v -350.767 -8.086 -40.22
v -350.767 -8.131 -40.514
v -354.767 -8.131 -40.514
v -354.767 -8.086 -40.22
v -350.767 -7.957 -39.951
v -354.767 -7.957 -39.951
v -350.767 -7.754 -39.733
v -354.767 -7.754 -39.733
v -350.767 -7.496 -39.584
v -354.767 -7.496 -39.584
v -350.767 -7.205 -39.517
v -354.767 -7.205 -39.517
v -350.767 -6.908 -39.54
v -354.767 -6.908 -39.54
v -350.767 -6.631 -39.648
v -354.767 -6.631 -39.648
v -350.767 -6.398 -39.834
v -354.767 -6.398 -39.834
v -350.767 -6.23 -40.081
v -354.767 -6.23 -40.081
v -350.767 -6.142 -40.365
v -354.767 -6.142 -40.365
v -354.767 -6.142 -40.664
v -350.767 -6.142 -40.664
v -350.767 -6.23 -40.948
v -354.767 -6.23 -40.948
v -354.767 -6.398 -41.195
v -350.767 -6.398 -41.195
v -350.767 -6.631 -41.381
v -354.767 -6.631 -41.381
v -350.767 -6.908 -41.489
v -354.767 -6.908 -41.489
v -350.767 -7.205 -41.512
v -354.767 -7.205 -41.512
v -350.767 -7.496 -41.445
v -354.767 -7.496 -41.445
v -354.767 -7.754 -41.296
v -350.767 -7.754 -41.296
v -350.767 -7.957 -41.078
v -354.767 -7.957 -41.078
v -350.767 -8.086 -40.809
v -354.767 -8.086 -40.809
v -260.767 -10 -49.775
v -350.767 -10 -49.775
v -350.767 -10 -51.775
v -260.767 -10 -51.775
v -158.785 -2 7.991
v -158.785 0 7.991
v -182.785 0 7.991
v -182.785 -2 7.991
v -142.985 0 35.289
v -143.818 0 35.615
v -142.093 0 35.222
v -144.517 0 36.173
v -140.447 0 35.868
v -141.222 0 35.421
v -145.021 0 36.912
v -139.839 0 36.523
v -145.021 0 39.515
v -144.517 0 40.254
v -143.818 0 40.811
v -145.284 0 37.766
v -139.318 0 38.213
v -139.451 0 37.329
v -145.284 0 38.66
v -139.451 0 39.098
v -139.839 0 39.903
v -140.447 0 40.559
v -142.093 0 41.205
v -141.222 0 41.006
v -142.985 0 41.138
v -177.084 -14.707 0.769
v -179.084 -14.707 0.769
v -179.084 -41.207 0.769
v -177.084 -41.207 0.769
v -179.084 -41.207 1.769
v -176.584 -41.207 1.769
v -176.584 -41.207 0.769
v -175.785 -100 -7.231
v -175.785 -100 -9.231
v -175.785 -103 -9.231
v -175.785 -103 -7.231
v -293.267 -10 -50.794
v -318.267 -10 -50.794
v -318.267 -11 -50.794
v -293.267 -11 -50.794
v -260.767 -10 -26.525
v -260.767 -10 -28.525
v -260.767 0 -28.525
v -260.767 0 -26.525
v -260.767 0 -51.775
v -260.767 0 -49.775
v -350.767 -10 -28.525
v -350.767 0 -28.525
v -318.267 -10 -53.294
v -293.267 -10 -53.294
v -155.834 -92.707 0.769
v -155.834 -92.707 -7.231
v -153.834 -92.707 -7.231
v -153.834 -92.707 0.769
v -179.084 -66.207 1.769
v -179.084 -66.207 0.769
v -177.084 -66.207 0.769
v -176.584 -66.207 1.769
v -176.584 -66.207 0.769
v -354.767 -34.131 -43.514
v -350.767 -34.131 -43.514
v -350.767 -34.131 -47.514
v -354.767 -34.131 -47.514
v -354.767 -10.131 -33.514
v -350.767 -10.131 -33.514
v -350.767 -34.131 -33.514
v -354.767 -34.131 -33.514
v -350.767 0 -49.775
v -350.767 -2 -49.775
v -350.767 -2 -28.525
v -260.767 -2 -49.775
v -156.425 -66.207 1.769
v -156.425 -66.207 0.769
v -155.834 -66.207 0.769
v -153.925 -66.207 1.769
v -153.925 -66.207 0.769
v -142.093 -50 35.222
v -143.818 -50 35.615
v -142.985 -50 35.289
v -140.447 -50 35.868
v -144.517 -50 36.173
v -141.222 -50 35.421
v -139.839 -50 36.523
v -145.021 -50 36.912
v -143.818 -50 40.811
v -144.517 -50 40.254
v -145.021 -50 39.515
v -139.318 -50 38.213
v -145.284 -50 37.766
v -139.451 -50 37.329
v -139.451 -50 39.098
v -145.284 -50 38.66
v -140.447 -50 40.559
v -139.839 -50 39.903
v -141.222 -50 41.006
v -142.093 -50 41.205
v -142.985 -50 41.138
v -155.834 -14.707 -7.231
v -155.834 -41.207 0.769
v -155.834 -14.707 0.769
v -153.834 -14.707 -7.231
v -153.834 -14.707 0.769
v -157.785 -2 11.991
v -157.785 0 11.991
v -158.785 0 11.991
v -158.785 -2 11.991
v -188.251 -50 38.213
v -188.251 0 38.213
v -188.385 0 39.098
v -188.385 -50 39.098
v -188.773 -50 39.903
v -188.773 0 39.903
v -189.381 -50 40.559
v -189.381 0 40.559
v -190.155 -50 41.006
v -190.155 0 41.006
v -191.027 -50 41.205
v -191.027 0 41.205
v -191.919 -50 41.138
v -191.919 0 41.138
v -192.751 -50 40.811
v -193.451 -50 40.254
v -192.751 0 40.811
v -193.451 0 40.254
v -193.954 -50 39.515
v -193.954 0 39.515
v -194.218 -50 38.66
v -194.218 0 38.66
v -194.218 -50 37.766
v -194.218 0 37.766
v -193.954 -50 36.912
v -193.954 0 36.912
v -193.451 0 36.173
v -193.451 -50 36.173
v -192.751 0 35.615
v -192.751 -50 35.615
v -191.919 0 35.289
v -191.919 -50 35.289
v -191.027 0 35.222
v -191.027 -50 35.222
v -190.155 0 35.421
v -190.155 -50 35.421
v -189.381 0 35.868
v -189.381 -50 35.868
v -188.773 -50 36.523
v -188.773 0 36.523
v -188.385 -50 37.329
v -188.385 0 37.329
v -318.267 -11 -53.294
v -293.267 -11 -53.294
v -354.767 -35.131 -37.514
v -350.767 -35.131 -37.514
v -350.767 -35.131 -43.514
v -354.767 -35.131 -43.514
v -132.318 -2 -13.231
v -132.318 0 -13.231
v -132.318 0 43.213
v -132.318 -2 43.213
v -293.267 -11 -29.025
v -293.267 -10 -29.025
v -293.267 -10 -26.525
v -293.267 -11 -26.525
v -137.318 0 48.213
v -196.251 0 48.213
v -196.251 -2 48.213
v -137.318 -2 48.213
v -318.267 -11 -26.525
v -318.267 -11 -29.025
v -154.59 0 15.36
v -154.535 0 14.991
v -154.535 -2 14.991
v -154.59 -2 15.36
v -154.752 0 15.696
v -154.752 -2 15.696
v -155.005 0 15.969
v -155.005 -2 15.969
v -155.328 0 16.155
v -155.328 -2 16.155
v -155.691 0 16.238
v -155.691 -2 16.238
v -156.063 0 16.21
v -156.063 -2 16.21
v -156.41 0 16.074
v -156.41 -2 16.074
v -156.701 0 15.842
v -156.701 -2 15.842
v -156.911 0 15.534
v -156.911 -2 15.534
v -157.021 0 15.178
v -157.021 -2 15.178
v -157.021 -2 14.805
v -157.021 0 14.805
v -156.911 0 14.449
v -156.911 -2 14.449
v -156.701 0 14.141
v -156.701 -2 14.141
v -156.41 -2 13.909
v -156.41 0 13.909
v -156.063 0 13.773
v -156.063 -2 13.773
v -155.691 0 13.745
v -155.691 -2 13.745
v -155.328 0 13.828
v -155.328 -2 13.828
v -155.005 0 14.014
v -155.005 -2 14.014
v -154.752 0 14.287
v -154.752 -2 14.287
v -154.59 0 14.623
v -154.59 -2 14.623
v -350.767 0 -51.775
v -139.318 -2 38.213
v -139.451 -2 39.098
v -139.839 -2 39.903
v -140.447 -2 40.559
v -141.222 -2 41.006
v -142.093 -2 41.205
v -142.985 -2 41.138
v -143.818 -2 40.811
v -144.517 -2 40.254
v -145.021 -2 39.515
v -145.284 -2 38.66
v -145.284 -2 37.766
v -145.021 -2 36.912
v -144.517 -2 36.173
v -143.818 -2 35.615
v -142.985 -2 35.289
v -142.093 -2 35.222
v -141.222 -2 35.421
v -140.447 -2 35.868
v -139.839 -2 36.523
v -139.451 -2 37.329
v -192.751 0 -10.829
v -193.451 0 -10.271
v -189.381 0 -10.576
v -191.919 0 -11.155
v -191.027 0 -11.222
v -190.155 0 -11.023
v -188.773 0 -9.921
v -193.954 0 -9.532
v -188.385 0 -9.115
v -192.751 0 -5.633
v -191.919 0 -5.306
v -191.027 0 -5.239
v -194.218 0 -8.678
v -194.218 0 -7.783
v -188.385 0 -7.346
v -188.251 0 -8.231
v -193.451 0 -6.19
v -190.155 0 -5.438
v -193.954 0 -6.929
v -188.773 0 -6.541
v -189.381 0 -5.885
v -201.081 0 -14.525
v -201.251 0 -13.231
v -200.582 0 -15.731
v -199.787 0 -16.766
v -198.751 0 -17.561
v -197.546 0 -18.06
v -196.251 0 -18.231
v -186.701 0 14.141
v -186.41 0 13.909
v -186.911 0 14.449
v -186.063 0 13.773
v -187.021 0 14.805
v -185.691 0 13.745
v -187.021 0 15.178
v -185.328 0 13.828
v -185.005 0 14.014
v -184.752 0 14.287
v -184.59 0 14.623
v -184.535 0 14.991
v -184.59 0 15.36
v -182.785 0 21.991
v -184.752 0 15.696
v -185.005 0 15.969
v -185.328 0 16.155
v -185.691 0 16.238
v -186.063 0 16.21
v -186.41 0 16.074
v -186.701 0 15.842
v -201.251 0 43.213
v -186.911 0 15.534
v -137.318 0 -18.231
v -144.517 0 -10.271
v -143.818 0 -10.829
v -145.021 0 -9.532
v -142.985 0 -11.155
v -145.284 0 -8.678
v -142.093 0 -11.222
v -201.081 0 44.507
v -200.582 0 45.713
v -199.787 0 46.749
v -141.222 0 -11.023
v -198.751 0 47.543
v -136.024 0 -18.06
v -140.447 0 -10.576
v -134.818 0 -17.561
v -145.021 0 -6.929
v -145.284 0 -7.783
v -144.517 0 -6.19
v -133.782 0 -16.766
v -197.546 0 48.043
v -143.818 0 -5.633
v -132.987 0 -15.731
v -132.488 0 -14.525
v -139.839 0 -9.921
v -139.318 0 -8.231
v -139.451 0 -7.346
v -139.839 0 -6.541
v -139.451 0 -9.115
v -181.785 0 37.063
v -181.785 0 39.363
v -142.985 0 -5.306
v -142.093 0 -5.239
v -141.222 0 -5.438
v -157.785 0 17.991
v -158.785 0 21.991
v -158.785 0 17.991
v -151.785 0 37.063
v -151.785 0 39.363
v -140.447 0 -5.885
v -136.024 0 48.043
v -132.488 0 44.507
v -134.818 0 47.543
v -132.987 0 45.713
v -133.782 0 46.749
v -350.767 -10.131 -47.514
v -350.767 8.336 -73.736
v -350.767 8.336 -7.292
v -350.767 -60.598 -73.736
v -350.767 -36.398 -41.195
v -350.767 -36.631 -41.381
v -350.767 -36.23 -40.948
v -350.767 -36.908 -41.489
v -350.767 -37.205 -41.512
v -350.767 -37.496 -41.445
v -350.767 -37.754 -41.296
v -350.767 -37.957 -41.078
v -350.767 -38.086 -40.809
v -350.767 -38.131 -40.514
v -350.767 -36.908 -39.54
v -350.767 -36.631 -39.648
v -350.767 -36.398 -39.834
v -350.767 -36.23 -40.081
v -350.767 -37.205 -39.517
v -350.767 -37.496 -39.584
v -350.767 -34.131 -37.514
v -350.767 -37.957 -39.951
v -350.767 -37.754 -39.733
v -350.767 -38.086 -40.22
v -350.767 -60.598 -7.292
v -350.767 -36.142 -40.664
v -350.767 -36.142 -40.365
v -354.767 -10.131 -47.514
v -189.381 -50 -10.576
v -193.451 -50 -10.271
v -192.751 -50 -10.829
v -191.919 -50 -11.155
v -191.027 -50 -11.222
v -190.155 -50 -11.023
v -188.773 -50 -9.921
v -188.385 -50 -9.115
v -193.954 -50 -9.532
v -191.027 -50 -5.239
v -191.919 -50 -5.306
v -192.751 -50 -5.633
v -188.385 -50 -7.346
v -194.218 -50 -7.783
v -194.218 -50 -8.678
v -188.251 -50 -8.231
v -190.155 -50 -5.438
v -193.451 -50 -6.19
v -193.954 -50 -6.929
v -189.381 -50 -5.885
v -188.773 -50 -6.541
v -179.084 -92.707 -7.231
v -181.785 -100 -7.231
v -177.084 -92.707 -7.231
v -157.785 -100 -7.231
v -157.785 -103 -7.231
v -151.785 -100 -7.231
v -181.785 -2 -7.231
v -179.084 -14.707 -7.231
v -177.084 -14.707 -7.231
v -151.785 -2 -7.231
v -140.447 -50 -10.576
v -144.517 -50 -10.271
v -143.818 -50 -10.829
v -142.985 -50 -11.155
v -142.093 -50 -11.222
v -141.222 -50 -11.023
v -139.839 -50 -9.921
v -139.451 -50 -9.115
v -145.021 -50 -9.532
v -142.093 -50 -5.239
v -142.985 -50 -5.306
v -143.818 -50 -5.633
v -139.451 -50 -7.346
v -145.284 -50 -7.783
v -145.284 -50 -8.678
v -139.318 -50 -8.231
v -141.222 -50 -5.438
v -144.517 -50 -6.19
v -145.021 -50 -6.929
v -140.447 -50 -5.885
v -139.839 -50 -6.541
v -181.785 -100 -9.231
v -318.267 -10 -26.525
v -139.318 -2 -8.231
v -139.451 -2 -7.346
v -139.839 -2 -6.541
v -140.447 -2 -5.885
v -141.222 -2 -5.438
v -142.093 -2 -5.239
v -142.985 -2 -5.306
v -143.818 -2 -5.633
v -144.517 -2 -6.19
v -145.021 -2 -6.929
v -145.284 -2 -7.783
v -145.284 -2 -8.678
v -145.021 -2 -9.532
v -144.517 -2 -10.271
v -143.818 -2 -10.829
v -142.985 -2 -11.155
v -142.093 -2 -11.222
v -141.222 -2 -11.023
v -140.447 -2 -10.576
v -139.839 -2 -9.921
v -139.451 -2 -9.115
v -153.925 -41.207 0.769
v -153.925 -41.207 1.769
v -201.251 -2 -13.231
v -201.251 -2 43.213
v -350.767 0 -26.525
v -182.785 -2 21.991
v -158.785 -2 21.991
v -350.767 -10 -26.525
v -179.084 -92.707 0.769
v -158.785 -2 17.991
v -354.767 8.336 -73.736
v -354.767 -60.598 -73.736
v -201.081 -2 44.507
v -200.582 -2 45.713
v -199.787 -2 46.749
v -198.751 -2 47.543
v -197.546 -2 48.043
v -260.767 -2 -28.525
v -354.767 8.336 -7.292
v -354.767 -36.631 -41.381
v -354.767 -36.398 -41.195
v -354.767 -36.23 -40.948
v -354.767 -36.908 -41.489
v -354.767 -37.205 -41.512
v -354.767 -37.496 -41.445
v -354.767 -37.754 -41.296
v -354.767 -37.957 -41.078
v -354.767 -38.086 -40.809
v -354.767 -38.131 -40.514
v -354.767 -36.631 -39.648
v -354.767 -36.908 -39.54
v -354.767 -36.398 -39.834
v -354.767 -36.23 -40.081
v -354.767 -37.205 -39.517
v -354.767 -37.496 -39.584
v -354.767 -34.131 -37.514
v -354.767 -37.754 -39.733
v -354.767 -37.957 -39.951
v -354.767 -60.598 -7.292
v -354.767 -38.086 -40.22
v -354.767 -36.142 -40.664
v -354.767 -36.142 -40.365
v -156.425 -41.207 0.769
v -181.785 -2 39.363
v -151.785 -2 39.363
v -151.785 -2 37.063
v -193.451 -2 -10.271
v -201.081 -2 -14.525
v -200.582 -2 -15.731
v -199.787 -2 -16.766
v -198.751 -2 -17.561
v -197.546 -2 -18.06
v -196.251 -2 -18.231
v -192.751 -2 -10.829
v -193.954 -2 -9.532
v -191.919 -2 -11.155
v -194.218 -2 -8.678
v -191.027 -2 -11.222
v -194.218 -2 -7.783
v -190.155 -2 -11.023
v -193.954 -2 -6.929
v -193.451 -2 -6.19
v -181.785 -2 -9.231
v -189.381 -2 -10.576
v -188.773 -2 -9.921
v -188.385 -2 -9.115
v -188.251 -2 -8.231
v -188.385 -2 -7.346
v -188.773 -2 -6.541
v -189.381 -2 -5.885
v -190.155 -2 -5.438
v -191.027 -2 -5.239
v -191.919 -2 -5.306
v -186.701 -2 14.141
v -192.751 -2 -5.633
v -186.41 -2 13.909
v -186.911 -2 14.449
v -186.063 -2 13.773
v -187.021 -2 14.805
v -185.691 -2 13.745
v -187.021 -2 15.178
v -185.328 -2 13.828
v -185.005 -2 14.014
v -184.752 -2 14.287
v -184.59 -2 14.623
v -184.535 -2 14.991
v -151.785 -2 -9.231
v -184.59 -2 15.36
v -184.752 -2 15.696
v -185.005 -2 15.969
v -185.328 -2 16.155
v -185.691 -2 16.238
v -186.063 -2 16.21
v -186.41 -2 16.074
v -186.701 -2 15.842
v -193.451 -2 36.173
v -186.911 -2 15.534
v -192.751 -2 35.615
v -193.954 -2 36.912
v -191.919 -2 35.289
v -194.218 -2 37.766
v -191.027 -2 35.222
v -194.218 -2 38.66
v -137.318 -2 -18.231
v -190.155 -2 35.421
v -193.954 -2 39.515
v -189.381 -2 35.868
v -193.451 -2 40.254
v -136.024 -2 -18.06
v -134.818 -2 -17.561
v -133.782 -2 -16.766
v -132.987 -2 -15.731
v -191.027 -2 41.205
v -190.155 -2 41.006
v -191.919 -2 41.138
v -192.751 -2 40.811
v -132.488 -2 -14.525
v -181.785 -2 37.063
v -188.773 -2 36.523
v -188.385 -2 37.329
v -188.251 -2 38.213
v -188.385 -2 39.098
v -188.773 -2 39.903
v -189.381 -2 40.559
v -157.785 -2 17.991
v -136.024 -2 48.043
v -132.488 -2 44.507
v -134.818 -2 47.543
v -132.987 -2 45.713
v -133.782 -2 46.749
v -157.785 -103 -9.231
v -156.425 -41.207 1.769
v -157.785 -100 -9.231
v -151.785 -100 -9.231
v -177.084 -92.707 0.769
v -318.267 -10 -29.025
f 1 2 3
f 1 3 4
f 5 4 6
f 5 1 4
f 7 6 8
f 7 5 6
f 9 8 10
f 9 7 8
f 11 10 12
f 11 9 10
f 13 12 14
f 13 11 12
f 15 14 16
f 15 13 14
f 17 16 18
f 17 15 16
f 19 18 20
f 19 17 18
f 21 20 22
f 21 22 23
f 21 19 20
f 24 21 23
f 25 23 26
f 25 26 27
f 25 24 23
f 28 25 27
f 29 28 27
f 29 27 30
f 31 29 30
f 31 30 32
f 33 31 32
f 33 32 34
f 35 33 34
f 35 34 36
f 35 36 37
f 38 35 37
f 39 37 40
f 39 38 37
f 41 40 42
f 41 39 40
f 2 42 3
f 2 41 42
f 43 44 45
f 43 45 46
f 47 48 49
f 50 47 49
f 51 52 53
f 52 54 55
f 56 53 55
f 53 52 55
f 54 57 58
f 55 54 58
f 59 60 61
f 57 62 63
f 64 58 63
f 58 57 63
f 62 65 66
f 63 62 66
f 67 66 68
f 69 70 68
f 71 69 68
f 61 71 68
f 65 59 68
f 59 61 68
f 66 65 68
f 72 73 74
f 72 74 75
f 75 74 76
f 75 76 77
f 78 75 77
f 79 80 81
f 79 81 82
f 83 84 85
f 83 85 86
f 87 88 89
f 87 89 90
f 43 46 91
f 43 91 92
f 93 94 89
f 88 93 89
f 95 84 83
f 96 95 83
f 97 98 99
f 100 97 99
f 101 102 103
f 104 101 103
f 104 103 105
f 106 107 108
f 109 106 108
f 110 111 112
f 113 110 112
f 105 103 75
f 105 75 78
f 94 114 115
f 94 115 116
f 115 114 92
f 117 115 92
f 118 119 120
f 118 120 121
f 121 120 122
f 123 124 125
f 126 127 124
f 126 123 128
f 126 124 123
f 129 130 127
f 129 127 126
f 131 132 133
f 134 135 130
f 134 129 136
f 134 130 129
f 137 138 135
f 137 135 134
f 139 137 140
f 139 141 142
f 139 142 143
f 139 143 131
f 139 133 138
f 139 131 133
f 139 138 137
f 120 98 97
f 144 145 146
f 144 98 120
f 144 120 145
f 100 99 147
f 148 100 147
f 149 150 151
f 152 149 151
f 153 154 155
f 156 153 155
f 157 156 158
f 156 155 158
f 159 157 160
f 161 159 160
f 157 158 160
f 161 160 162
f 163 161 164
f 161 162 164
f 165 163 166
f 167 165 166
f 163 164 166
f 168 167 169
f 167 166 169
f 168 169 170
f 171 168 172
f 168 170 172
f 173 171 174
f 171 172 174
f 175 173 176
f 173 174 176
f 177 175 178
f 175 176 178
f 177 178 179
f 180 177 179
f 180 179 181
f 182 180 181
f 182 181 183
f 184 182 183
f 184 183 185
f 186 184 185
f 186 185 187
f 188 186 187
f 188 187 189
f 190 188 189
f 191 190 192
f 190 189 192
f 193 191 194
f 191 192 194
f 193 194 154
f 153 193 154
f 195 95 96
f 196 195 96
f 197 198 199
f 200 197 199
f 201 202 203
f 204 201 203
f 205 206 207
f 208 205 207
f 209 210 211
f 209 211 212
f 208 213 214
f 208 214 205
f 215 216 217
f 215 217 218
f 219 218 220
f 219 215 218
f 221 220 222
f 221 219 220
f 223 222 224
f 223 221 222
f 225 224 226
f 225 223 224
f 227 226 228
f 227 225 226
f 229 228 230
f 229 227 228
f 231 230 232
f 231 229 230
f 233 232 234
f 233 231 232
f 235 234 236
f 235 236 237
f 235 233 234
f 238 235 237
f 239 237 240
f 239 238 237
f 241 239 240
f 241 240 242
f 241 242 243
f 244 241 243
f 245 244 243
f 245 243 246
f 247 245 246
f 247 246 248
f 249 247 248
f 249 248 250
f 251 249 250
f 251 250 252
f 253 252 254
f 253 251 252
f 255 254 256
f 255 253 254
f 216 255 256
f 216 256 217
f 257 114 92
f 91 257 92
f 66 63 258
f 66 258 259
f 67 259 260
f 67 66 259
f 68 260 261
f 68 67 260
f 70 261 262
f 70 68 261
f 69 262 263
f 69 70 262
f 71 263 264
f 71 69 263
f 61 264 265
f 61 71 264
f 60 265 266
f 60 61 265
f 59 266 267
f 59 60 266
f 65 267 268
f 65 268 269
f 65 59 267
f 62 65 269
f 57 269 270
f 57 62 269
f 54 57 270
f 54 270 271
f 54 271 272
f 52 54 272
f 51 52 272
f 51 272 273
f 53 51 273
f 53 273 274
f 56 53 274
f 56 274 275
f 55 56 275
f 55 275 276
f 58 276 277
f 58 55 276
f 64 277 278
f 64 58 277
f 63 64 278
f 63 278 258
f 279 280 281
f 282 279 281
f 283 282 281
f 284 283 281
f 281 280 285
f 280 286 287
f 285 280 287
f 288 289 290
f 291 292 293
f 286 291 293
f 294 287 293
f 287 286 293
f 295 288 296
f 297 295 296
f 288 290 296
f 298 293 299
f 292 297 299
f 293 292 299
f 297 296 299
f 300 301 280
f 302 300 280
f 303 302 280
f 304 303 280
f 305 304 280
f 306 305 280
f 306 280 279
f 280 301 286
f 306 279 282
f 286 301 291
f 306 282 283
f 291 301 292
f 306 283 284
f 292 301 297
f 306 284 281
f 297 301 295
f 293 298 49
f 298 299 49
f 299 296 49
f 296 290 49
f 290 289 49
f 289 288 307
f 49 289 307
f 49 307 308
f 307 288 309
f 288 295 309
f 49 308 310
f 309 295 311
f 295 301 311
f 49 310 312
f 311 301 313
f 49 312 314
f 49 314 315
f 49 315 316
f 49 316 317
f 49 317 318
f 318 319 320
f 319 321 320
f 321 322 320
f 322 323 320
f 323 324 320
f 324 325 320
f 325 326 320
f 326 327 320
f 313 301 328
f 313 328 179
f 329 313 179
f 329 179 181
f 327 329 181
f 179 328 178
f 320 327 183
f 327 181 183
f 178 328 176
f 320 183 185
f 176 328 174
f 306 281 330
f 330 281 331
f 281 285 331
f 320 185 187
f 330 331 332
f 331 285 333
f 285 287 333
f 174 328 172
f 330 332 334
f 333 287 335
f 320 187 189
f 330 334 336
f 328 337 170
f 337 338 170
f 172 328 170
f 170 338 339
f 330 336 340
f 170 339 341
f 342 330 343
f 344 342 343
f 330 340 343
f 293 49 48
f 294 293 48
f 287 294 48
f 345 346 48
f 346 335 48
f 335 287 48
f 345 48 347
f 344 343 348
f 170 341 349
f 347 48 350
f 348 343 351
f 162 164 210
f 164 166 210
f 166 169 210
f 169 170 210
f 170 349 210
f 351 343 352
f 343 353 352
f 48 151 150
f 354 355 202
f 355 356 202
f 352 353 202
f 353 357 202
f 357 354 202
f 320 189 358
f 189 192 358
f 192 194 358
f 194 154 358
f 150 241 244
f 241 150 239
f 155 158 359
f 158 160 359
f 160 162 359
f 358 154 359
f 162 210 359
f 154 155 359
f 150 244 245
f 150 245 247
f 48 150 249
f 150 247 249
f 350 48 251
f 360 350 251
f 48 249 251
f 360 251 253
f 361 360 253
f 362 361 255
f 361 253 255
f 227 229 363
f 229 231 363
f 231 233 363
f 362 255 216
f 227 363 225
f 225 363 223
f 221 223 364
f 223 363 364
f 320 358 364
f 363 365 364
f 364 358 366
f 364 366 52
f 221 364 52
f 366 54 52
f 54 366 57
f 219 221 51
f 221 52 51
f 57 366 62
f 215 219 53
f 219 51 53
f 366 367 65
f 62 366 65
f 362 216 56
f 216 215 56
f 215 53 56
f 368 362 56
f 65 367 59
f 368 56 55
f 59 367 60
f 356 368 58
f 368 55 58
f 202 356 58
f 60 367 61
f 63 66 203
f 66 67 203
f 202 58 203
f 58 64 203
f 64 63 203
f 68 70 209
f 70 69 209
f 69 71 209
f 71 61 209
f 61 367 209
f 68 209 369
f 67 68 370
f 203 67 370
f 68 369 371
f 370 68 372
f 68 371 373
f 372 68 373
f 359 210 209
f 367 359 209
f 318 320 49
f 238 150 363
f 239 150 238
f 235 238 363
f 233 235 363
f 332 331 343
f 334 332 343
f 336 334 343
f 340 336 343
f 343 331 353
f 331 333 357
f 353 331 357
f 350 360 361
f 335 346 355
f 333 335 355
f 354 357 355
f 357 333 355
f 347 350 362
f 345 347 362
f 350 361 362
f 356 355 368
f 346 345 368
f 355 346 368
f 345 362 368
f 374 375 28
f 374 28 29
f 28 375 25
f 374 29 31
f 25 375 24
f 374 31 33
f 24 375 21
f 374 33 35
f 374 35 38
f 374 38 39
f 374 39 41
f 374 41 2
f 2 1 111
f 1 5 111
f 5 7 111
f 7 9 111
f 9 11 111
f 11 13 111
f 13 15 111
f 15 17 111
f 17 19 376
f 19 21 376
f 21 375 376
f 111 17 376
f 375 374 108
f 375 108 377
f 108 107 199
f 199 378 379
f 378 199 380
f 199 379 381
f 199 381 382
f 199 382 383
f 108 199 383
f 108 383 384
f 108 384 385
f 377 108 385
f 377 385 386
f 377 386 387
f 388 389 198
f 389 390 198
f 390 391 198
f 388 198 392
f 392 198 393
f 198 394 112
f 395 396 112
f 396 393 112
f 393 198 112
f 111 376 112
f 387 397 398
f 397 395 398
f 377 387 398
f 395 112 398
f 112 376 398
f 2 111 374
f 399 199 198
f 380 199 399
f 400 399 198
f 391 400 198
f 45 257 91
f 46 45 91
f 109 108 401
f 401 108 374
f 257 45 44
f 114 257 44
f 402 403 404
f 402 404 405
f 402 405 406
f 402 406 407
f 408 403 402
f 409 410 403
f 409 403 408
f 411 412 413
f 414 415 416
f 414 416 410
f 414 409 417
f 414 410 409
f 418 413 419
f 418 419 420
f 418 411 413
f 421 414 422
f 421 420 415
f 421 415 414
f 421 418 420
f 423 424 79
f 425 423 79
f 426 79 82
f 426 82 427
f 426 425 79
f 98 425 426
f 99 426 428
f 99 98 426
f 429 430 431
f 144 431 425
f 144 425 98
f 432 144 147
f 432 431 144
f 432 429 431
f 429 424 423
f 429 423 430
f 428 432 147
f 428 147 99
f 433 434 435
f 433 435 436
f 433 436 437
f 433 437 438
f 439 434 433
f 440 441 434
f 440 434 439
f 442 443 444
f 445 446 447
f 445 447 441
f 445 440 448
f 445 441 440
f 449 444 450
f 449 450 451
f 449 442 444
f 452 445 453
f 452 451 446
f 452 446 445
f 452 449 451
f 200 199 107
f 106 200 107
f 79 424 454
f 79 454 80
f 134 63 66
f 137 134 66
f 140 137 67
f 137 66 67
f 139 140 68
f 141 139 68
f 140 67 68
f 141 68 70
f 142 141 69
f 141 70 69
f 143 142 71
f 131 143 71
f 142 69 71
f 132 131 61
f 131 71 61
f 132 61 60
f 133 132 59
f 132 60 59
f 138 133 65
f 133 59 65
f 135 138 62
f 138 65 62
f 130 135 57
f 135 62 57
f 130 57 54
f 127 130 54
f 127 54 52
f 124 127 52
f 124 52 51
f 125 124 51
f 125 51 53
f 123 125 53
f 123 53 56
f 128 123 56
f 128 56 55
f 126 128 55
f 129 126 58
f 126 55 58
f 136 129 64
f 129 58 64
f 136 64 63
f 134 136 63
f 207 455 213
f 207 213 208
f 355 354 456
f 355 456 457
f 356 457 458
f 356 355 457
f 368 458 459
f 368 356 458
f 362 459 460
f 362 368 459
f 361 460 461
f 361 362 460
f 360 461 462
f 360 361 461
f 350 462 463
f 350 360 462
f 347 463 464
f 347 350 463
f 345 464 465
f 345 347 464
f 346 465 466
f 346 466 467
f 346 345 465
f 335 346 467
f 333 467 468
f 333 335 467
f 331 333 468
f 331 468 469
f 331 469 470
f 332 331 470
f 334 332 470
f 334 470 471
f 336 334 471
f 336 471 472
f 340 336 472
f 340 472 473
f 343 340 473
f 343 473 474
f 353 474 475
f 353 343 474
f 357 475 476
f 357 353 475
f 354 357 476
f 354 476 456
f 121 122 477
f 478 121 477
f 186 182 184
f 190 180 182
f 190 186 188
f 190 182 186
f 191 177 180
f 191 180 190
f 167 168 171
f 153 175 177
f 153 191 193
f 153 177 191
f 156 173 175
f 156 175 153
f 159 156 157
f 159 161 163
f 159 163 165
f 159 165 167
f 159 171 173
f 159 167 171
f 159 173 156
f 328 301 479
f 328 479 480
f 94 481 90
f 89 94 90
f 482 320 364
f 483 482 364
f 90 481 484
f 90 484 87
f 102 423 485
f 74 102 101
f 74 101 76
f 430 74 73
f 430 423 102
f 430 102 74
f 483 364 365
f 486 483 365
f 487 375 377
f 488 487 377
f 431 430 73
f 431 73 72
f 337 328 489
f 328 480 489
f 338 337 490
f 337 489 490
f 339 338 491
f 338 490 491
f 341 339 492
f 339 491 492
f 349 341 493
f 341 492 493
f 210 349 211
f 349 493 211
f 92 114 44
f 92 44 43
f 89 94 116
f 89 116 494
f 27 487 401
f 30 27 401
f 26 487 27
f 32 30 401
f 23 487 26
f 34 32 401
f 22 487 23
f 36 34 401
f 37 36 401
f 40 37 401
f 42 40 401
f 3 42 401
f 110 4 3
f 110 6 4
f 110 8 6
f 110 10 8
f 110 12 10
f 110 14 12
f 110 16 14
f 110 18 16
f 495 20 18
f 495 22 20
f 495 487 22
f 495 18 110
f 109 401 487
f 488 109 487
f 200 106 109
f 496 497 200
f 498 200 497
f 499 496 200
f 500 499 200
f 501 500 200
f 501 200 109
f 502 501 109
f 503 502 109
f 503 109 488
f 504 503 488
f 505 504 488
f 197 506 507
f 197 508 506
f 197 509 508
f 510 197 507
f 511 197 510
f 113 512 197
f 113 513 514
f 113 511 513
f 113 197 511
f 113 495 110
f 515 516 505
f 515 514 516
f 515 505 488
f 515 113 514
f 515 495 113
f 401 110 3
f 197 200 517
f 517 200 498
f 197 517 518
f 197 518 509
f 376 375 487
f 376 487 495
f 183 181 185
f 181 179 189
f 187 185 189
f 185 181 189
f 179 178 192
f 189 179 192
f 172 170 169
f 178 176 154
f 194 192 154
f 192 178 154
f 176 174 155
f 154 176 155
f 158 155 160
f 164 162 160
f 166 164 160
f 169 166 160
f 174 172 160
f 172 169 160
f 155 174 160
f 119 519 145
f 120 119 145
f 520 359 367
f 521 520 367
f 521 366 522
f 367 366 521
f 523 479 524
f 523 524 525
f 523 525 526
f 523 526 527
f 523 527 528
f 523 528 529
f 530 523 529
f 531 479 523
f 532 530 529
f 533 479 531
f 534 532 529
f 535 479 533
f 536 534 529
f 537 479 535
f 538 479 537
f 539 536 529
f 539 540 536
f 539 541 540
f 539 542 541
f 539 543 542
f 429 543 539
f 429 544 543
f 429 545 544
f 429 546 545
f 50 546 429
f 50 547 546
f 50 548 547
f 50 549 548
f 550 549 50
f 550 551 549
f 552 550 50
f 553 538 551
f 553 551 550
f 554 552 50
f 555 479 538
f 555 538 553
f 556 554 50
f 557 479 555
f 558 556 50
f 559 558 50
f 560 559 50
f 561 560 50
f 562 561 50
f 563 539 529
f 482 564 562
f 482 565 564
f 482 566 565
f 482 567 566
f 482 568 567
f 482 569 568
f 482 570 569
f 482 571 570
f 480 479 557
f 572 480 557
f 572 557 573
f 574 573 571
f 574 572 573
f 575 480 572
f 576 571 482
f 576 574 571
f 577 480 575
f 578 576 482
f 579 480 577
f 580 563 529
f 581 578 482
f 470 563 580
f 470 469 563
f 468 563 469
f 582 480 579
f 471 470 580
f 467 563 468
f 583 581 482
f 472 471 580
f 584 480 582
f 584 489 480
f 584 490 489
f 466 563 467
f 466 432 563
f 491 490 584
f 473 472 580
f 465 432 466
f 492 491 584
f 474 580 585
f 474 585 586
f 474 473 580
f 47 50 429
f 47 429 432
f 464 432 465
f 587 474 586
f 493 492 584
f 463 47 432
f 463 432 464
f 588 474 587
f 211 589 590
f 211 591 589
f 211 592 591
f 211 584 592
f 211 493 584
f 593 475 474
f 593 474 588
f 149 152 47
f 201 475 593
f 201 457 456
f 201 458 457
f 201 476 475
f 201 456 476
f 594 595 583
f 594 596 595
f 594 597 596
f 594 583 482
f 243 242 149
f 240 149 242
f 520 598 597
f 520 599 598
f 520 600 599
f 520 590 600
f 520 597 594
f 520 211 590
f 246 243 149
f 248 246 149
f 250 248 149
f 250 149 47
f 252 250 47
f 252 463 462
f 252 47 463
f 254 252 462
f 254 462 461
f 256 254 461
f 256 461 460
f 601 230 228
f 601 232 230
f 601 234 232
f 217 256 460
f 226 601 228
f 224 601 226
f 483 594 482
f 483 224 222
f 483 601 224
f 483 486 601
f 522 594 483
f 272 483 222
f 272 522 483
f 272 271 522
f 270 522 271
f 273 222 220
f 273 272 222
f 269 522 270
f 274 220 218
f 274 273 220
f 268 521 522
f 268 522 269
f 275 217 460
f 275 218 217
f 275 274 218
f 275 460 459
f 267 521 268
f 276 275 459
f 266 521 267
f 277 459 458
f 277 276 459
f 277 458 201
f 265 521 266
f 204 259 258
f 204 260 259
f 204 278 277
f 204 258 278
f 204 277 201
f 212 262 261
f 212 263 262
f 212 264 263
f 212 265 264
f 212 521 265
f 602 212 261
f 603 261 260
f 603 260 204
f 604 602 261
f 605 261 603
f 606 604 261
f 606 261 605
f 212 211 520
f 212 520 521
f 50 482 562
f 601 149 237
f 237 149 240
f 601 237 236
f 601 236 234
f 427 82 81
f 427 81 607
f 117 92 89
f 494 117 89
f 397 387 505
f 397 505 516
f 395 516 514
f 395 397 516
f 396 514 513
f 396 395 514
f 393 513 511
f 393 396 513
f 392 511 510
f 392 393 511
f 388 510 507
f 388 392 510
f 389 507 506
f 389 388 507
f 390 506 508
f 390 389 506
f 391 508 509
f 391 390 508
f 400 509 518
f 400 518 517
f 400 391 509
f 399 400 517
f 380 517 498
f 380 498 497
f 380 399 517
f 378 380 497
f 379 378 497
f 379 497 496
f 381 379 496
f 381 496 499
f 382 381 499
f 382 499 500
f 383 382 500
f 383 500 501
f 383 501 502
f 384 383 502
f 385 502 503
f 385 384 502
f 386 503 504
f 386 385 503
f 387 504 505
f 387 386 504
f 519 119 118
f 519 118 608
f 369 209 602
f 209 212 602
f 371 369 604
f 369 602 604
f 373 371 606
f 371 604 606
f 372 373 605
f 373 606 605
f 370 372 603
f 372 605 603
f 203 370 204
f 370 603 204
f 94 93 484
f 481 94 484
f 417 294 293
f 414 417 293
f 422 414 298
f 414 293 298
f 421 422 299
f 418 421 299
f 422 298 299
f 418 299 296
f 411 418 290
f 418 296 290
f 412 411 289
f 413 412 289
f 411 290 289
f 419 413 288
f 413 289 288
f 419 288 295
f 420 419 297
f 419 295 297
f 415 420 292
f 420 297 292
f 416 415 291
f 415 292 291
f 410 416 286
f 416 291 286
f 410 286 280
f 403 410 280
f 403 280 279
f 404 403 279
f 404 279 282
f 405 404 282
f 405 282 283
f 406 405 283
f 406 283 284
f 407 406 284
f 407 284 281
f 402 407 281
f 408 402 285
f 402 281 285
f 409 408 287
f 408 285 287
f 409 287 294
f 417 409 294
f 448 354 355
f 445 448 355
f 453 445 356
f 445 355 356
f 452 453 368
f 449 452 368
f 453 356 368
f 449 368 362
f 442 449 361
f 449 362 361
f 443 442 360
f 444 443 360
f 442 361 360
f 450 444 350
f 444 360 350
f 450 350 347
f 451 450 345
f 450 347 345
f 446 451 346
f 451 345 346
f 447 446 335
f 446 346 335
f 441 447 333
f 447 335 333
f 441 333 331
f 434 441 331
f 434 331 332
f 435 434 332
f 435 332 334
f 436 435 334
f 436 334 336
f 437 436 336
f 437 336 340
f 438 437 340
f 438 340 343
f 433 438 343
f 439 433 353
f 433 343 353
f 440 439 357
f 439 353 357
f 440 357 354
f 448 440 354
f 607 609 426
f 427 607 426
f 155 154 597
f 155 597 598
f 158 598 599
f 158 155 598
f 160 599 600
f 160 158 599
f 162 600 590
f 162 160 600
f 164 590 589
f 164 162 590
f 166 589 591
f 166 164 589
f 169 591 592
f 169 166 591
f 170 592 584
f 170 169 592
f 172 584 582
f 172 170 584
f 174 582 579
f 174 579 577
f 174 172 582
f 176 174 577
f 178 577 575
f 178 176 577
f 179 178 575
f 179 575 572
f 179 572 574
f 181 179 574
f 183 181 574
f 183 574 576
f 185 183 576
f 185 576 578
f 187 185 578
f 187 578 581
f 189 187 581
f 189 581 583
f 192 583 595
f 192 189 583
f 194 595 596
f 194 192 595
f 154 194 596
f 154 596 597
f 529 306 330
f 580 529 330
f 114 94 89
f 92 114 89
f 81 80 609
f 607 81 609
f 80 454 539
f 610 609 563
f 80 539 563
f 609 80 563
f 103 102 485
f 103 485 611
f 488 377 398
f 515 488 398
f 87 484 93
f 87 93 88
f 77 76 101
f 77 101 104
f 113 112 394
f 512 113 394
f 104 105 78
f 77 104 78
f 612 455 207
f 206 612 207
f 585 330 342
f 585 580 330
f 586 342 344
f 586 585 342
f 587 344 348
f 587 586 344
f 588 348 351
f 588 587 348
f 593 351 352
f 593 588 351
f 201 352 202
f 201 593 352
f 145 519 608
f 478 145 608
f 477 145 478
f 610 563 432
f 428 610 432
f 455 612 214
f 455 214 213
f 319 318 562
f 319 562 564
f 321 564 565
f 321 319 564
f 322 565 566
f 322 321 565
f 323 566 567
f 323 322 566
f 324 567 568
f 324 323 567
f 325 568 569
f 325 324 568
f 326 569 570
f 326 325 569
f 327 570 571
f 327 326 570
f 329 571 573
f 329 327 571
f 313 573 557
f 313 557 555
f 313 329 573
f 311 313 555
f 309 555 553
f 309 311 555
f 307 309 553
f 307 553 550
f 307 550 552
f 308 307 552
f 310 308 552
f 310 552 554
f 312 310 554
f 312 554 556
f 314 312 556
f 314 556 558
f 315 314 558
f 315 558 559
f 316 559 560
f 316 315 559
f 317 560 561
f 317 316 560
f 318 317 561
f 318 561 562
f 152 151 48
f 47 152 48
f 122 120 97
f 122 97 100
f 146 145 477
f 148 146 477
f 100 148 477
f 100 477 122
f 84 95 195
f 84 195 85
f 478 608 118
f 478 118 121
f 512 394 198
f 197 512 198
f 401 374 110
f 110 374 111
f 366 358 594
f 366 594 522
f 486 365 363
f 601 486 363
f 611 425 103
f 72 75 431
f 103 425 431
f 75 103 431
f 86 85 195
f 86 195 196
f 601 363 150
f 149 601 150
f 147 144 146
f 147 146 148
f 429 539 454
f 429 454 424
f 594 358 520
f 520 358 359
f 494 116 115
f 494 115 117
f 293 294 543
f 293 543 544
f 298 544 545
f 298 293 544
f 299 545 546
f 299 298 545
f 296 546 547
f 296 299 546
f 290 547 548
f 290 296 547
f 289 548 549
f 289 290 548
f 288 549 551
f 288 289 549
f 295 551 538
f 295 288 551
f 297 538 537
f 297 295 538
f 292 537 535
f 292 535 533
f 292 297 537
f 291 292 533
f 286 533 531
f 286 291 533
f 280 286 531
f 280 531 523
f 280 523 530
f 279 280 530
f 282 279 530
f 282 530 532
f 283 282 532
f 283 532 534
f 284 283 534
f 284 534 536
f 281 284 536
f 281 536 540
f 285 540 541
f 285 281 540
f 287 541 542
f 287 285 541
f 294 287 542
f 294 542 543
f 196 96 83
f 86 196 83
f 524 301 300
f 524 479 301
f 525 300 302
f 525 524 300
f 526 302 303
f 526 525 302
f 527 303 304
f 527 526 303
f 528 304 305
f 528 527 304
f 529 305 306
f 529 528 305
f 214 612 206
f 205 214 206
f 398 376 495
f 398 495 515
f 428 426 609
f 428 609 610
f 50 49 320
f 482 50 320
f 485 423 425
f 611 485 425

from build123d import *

# Parameters (mm, degrees)
F0_R      = 3
F1_DEPTH  = 50
F0_W      = 68.9338020737
F0_H      = 66.44398
F0_W_2    = 30
F0_H_2    = 2
F0_R_2    = 1.25
F0_H_3    = 2.3
F2_DEPTH  = 2
F0_W_3    = 90
F3_DEPTH  = 10
F0_H_4    = 21.25
F4_DEPTH  = 2
F5_W      = 25
F5_H      = 2.5
F6_DEPTH  = 1
F7_R      = 5
F8_W      = 68.9338020737
F8_H      = 66.44398
F8_R      = 1
F8_W_2    = 2
F8_H_2    = 21.25
F9_DEPTH  = 4
F10_DEPTH = 100
F11_W     = 2
F11_H     = 78
F12_DEPTH = 8
F13_W     = 2.5
F13_H     = 25
F14_DEPTH = 1
F15_W     = 18
F15_H     = 2
F16_DEPTH = 3


with BuildPart() as f1:
    # F0 (on Front) → F1 (new body)
    with BuildSketch(Plane.XZ):
        with Locations((-191.2514259544, 38.213372719)):
            Circle(F0_R)
    extrude(amount=F1_DEPTH)


with BuildPart() as f1b:
    # F0 (on Front) → F1, piece 2 (new body)
    with BuildSketch(Plane.XZ):
        with Locations((-142.3176238808, 38.213372719)):
            Circle(F0_R)
    extrude(amount=F1_DEPTH)


with BuildPart() as f1c:
    # F0 (on Front) → F1, piece 3 (new body)
    with BuildSketch(Plane.XZ):
        with Locations((-142.3176238808, -8.230607281)):
            Circle(F0_R)
    extrude(amount=F1_DEPTH)


with BuildPart() as f1d:
    # F0 (on Front) → F1, piece 4 (new body)
    with BuildSketch(Plane.XZ):
        with Locations((-191.2514259544, -8.230607281)):
            Circle(F0_R)
    extrude(amount=F1_DEPTH)


with BuildPart() as f2:
    # F0 (on Front) → F2 (new body)
    with BuildSketch(Plane.XZ):
        with Locations((-166.7845249176, 14.991382719)):
            Rectangle(F0_W, F0_H)
        with Locations((-191.2514259544, -8.230607281)):
            Circle(F0_R, mode=Mode.SUBTRACT)
        with Locations((-166.7845249176, -8.230607281)):
            Rectangle(F0_W_2, F0_H_2, mode=Mode.SUBTRACT)
        with Locations((-142.3176238808, -8.230607281)):
            Circle(F0_R, mode=Mode.SUBTRACT)
        with Locations((-185.7845249176, 14.991382719)):
            Circle(F0_R_2, mode=Mode.SUBTRACT)
        Polygon((-182.7845249176, 21.991382719), (-158.7845249176, 21.991382719), (-158.7845249176, 17.991382719), (-157.7845249176, 17.991382719), (-157.7845249176, 11.991382719), (-158.7845249176, 11.991382719), (-158.7845249176, 7.991382719), (-182.7845249176, 7.991382719), align=None, mode=Mode.SUBTRACT)
        with Locations((-155.7845249176, 14.991382719)):
            Circle(F0_R_2, mode=Mode.SUBTRACT)
        with Locations((-191.2514259544, 38.213372719)):
            Circle(F0_R, mode=Mode.SUBTRACT)
        with Locations((-166.7845249176, 38.213372719)):
            Rectangle(F0_W_2, F0_H_3, mode=Mode.SUBTRACT)
        with Locations((-142.3176238808, 38.213372719)):
            Circle(F0_R, mode=Mode.SUBTRACT)
    extrude(amount=F2_DEPTH)

    # F7
    f7_edges = [f2.edges().sort_by_distance(p)[0] for p in [
        (-201.251426, -1, 48.213373),
        (-132.317624, -1, 48.213373),
        (-132.317624, -1, -18.230607),
        (-201.251426, -1, -18.230607),
    ]]
    fillet(f7_edges, radius=F7_R)

    # F0 (on Front) → F10 (join)
    with BuildSketch(Plane.XZ):
        with Locations((-166.7845249176, -8.230607281)):
            Rectangle(F0_W_2, F0_H_2)
    extrude(amount=F10_DEPTH)

    # F11 (on face) → F12 (join)
    with BuildSketch(Plane.XY.offset(-7.230607281)):
        with Locations((-178.0836216211, -53.7072308362)):
            Rectangle(F11_W, F11_H)
        with Locations((-154.8336216211, -53.7072308362)):
            Rectangle(F11_W, F11_H)
    extrude(amount=F12_DEPTH)

    # F13 (on face) → F14 (join)
    with BuildSketch(Plane.XY.offset(0.769392719)):
        with Locations((-177.8336216211, -53.7072308362)):
            Rectangle(F13_W, F13_H)
        with Locations((-155.1746141911, -53.7072308362)):
            Rectangle(F13_W, F13_H)
    extrude(amount=F14_DEPTH)

    # F15 (on face) → F16 (join)
    with BuildSketch(Plane.XZ.offset(100)):
        with Locations((-166.7845249176, -8.230607281)):
            Rectangle(F15_W, F15_H)
    extrude(amount=F16_DEPTH)


with BuildPart() as f3:
    # F0 (on Front) → F3 (new body)
    with BuildSketch(Plane.XZ):
        with Locations((-305.766658783, -27.5253735185)):
            Rectangle(F0_W_3, F0_H_2)
    extrude(amount=F3_DEPTH)


with BuildPart() as f3b:
    # F0 (on Front) → F3, piece 2 (new body)
    with BuildSketch(Plane.XZ):
        with Locations((-305.766658783, -50.7753735185)):
            Rectangle(F0_W_3, F0_H_2)
    extrude(amount=F3_DEPTH)


with BuildPart() as f4:
    # F0 (on Front) → F4 (new body)
    with BuildSketch(Plane.XZ):
        with Locations((-305.766658783, -39.1503735185)):
            Rectangle(F0_W_3, F0_H_4)
    extrude(amount=F4_DEPTH)


with BuildPart() as f6:
    # F5 (on face) → F6 (new body)
    with BuildSketch(Plane.XZ.offset(10)):
        with Locations((-305.766658783, -27.7753735185)):
            Rectangle(F5_W, F5_H)
    extrude(amount=F6_DEPTH)


with BuildPart() as f6b:
    # F5 (on face) → F6, piece 2 (new body)
    with BuildSketch(Plane.XZ.offset(10)):
        with Locations((-305.766658783, -52.0439434052)):
            Rectangle(F5_W, F5_H)
    extrude(amount=F6_DEPTH)


with BuildPart() as f9:
    # F8 (on face) → F9 (new body)
    with BuildSketch(Plane(origin=(-350.766658783, 0, 0), x_dir=(0, -1, 0), z_dir=(-1, 0, 0))):
        with Locations((26.1306043836, -40.5144899269)):
            Rectangle(F8_W, F8_H)
        with Locations((7.1306043836, -40.5144899269)):
            Circle(F8_R, mode=Mode.SUBTRACT)
        with Locations((37.1306043836, -40.5144899269)):
            Circle(F8_R, mode=Mode.SUBTRACT)
        with Locations((1, -39.1503735185)):
            Rectangle(F8_W_2, F8_H_2, mode=Mode.SUBTRACT)
        Polygon((10.1306043836, -33.5144899269), (34.1306043836, -33.5144899269), (34.1306043836, -37.5144899269), (35.1306043836, -37.5144899269), (35.1306043836, -43.5144899269), (34.1306043836, -43.5144899269), (34.1306043836, -47.5144899269), (10.1306043836, -47.5144899269), align=None, mode=Mode.SUBTRACT)
        with Locations((1, -39.1503735185)):
            Rectangle(F8_W_2, F8_H_2)
    extrude(amount=F9_DEPTH)


solid = Compound([f1.part, f1b.part, f1c.part, f1d.part, f2.part, f3.part, f3b.part, f4.part, f6.part, f6b.part, f9.part])
